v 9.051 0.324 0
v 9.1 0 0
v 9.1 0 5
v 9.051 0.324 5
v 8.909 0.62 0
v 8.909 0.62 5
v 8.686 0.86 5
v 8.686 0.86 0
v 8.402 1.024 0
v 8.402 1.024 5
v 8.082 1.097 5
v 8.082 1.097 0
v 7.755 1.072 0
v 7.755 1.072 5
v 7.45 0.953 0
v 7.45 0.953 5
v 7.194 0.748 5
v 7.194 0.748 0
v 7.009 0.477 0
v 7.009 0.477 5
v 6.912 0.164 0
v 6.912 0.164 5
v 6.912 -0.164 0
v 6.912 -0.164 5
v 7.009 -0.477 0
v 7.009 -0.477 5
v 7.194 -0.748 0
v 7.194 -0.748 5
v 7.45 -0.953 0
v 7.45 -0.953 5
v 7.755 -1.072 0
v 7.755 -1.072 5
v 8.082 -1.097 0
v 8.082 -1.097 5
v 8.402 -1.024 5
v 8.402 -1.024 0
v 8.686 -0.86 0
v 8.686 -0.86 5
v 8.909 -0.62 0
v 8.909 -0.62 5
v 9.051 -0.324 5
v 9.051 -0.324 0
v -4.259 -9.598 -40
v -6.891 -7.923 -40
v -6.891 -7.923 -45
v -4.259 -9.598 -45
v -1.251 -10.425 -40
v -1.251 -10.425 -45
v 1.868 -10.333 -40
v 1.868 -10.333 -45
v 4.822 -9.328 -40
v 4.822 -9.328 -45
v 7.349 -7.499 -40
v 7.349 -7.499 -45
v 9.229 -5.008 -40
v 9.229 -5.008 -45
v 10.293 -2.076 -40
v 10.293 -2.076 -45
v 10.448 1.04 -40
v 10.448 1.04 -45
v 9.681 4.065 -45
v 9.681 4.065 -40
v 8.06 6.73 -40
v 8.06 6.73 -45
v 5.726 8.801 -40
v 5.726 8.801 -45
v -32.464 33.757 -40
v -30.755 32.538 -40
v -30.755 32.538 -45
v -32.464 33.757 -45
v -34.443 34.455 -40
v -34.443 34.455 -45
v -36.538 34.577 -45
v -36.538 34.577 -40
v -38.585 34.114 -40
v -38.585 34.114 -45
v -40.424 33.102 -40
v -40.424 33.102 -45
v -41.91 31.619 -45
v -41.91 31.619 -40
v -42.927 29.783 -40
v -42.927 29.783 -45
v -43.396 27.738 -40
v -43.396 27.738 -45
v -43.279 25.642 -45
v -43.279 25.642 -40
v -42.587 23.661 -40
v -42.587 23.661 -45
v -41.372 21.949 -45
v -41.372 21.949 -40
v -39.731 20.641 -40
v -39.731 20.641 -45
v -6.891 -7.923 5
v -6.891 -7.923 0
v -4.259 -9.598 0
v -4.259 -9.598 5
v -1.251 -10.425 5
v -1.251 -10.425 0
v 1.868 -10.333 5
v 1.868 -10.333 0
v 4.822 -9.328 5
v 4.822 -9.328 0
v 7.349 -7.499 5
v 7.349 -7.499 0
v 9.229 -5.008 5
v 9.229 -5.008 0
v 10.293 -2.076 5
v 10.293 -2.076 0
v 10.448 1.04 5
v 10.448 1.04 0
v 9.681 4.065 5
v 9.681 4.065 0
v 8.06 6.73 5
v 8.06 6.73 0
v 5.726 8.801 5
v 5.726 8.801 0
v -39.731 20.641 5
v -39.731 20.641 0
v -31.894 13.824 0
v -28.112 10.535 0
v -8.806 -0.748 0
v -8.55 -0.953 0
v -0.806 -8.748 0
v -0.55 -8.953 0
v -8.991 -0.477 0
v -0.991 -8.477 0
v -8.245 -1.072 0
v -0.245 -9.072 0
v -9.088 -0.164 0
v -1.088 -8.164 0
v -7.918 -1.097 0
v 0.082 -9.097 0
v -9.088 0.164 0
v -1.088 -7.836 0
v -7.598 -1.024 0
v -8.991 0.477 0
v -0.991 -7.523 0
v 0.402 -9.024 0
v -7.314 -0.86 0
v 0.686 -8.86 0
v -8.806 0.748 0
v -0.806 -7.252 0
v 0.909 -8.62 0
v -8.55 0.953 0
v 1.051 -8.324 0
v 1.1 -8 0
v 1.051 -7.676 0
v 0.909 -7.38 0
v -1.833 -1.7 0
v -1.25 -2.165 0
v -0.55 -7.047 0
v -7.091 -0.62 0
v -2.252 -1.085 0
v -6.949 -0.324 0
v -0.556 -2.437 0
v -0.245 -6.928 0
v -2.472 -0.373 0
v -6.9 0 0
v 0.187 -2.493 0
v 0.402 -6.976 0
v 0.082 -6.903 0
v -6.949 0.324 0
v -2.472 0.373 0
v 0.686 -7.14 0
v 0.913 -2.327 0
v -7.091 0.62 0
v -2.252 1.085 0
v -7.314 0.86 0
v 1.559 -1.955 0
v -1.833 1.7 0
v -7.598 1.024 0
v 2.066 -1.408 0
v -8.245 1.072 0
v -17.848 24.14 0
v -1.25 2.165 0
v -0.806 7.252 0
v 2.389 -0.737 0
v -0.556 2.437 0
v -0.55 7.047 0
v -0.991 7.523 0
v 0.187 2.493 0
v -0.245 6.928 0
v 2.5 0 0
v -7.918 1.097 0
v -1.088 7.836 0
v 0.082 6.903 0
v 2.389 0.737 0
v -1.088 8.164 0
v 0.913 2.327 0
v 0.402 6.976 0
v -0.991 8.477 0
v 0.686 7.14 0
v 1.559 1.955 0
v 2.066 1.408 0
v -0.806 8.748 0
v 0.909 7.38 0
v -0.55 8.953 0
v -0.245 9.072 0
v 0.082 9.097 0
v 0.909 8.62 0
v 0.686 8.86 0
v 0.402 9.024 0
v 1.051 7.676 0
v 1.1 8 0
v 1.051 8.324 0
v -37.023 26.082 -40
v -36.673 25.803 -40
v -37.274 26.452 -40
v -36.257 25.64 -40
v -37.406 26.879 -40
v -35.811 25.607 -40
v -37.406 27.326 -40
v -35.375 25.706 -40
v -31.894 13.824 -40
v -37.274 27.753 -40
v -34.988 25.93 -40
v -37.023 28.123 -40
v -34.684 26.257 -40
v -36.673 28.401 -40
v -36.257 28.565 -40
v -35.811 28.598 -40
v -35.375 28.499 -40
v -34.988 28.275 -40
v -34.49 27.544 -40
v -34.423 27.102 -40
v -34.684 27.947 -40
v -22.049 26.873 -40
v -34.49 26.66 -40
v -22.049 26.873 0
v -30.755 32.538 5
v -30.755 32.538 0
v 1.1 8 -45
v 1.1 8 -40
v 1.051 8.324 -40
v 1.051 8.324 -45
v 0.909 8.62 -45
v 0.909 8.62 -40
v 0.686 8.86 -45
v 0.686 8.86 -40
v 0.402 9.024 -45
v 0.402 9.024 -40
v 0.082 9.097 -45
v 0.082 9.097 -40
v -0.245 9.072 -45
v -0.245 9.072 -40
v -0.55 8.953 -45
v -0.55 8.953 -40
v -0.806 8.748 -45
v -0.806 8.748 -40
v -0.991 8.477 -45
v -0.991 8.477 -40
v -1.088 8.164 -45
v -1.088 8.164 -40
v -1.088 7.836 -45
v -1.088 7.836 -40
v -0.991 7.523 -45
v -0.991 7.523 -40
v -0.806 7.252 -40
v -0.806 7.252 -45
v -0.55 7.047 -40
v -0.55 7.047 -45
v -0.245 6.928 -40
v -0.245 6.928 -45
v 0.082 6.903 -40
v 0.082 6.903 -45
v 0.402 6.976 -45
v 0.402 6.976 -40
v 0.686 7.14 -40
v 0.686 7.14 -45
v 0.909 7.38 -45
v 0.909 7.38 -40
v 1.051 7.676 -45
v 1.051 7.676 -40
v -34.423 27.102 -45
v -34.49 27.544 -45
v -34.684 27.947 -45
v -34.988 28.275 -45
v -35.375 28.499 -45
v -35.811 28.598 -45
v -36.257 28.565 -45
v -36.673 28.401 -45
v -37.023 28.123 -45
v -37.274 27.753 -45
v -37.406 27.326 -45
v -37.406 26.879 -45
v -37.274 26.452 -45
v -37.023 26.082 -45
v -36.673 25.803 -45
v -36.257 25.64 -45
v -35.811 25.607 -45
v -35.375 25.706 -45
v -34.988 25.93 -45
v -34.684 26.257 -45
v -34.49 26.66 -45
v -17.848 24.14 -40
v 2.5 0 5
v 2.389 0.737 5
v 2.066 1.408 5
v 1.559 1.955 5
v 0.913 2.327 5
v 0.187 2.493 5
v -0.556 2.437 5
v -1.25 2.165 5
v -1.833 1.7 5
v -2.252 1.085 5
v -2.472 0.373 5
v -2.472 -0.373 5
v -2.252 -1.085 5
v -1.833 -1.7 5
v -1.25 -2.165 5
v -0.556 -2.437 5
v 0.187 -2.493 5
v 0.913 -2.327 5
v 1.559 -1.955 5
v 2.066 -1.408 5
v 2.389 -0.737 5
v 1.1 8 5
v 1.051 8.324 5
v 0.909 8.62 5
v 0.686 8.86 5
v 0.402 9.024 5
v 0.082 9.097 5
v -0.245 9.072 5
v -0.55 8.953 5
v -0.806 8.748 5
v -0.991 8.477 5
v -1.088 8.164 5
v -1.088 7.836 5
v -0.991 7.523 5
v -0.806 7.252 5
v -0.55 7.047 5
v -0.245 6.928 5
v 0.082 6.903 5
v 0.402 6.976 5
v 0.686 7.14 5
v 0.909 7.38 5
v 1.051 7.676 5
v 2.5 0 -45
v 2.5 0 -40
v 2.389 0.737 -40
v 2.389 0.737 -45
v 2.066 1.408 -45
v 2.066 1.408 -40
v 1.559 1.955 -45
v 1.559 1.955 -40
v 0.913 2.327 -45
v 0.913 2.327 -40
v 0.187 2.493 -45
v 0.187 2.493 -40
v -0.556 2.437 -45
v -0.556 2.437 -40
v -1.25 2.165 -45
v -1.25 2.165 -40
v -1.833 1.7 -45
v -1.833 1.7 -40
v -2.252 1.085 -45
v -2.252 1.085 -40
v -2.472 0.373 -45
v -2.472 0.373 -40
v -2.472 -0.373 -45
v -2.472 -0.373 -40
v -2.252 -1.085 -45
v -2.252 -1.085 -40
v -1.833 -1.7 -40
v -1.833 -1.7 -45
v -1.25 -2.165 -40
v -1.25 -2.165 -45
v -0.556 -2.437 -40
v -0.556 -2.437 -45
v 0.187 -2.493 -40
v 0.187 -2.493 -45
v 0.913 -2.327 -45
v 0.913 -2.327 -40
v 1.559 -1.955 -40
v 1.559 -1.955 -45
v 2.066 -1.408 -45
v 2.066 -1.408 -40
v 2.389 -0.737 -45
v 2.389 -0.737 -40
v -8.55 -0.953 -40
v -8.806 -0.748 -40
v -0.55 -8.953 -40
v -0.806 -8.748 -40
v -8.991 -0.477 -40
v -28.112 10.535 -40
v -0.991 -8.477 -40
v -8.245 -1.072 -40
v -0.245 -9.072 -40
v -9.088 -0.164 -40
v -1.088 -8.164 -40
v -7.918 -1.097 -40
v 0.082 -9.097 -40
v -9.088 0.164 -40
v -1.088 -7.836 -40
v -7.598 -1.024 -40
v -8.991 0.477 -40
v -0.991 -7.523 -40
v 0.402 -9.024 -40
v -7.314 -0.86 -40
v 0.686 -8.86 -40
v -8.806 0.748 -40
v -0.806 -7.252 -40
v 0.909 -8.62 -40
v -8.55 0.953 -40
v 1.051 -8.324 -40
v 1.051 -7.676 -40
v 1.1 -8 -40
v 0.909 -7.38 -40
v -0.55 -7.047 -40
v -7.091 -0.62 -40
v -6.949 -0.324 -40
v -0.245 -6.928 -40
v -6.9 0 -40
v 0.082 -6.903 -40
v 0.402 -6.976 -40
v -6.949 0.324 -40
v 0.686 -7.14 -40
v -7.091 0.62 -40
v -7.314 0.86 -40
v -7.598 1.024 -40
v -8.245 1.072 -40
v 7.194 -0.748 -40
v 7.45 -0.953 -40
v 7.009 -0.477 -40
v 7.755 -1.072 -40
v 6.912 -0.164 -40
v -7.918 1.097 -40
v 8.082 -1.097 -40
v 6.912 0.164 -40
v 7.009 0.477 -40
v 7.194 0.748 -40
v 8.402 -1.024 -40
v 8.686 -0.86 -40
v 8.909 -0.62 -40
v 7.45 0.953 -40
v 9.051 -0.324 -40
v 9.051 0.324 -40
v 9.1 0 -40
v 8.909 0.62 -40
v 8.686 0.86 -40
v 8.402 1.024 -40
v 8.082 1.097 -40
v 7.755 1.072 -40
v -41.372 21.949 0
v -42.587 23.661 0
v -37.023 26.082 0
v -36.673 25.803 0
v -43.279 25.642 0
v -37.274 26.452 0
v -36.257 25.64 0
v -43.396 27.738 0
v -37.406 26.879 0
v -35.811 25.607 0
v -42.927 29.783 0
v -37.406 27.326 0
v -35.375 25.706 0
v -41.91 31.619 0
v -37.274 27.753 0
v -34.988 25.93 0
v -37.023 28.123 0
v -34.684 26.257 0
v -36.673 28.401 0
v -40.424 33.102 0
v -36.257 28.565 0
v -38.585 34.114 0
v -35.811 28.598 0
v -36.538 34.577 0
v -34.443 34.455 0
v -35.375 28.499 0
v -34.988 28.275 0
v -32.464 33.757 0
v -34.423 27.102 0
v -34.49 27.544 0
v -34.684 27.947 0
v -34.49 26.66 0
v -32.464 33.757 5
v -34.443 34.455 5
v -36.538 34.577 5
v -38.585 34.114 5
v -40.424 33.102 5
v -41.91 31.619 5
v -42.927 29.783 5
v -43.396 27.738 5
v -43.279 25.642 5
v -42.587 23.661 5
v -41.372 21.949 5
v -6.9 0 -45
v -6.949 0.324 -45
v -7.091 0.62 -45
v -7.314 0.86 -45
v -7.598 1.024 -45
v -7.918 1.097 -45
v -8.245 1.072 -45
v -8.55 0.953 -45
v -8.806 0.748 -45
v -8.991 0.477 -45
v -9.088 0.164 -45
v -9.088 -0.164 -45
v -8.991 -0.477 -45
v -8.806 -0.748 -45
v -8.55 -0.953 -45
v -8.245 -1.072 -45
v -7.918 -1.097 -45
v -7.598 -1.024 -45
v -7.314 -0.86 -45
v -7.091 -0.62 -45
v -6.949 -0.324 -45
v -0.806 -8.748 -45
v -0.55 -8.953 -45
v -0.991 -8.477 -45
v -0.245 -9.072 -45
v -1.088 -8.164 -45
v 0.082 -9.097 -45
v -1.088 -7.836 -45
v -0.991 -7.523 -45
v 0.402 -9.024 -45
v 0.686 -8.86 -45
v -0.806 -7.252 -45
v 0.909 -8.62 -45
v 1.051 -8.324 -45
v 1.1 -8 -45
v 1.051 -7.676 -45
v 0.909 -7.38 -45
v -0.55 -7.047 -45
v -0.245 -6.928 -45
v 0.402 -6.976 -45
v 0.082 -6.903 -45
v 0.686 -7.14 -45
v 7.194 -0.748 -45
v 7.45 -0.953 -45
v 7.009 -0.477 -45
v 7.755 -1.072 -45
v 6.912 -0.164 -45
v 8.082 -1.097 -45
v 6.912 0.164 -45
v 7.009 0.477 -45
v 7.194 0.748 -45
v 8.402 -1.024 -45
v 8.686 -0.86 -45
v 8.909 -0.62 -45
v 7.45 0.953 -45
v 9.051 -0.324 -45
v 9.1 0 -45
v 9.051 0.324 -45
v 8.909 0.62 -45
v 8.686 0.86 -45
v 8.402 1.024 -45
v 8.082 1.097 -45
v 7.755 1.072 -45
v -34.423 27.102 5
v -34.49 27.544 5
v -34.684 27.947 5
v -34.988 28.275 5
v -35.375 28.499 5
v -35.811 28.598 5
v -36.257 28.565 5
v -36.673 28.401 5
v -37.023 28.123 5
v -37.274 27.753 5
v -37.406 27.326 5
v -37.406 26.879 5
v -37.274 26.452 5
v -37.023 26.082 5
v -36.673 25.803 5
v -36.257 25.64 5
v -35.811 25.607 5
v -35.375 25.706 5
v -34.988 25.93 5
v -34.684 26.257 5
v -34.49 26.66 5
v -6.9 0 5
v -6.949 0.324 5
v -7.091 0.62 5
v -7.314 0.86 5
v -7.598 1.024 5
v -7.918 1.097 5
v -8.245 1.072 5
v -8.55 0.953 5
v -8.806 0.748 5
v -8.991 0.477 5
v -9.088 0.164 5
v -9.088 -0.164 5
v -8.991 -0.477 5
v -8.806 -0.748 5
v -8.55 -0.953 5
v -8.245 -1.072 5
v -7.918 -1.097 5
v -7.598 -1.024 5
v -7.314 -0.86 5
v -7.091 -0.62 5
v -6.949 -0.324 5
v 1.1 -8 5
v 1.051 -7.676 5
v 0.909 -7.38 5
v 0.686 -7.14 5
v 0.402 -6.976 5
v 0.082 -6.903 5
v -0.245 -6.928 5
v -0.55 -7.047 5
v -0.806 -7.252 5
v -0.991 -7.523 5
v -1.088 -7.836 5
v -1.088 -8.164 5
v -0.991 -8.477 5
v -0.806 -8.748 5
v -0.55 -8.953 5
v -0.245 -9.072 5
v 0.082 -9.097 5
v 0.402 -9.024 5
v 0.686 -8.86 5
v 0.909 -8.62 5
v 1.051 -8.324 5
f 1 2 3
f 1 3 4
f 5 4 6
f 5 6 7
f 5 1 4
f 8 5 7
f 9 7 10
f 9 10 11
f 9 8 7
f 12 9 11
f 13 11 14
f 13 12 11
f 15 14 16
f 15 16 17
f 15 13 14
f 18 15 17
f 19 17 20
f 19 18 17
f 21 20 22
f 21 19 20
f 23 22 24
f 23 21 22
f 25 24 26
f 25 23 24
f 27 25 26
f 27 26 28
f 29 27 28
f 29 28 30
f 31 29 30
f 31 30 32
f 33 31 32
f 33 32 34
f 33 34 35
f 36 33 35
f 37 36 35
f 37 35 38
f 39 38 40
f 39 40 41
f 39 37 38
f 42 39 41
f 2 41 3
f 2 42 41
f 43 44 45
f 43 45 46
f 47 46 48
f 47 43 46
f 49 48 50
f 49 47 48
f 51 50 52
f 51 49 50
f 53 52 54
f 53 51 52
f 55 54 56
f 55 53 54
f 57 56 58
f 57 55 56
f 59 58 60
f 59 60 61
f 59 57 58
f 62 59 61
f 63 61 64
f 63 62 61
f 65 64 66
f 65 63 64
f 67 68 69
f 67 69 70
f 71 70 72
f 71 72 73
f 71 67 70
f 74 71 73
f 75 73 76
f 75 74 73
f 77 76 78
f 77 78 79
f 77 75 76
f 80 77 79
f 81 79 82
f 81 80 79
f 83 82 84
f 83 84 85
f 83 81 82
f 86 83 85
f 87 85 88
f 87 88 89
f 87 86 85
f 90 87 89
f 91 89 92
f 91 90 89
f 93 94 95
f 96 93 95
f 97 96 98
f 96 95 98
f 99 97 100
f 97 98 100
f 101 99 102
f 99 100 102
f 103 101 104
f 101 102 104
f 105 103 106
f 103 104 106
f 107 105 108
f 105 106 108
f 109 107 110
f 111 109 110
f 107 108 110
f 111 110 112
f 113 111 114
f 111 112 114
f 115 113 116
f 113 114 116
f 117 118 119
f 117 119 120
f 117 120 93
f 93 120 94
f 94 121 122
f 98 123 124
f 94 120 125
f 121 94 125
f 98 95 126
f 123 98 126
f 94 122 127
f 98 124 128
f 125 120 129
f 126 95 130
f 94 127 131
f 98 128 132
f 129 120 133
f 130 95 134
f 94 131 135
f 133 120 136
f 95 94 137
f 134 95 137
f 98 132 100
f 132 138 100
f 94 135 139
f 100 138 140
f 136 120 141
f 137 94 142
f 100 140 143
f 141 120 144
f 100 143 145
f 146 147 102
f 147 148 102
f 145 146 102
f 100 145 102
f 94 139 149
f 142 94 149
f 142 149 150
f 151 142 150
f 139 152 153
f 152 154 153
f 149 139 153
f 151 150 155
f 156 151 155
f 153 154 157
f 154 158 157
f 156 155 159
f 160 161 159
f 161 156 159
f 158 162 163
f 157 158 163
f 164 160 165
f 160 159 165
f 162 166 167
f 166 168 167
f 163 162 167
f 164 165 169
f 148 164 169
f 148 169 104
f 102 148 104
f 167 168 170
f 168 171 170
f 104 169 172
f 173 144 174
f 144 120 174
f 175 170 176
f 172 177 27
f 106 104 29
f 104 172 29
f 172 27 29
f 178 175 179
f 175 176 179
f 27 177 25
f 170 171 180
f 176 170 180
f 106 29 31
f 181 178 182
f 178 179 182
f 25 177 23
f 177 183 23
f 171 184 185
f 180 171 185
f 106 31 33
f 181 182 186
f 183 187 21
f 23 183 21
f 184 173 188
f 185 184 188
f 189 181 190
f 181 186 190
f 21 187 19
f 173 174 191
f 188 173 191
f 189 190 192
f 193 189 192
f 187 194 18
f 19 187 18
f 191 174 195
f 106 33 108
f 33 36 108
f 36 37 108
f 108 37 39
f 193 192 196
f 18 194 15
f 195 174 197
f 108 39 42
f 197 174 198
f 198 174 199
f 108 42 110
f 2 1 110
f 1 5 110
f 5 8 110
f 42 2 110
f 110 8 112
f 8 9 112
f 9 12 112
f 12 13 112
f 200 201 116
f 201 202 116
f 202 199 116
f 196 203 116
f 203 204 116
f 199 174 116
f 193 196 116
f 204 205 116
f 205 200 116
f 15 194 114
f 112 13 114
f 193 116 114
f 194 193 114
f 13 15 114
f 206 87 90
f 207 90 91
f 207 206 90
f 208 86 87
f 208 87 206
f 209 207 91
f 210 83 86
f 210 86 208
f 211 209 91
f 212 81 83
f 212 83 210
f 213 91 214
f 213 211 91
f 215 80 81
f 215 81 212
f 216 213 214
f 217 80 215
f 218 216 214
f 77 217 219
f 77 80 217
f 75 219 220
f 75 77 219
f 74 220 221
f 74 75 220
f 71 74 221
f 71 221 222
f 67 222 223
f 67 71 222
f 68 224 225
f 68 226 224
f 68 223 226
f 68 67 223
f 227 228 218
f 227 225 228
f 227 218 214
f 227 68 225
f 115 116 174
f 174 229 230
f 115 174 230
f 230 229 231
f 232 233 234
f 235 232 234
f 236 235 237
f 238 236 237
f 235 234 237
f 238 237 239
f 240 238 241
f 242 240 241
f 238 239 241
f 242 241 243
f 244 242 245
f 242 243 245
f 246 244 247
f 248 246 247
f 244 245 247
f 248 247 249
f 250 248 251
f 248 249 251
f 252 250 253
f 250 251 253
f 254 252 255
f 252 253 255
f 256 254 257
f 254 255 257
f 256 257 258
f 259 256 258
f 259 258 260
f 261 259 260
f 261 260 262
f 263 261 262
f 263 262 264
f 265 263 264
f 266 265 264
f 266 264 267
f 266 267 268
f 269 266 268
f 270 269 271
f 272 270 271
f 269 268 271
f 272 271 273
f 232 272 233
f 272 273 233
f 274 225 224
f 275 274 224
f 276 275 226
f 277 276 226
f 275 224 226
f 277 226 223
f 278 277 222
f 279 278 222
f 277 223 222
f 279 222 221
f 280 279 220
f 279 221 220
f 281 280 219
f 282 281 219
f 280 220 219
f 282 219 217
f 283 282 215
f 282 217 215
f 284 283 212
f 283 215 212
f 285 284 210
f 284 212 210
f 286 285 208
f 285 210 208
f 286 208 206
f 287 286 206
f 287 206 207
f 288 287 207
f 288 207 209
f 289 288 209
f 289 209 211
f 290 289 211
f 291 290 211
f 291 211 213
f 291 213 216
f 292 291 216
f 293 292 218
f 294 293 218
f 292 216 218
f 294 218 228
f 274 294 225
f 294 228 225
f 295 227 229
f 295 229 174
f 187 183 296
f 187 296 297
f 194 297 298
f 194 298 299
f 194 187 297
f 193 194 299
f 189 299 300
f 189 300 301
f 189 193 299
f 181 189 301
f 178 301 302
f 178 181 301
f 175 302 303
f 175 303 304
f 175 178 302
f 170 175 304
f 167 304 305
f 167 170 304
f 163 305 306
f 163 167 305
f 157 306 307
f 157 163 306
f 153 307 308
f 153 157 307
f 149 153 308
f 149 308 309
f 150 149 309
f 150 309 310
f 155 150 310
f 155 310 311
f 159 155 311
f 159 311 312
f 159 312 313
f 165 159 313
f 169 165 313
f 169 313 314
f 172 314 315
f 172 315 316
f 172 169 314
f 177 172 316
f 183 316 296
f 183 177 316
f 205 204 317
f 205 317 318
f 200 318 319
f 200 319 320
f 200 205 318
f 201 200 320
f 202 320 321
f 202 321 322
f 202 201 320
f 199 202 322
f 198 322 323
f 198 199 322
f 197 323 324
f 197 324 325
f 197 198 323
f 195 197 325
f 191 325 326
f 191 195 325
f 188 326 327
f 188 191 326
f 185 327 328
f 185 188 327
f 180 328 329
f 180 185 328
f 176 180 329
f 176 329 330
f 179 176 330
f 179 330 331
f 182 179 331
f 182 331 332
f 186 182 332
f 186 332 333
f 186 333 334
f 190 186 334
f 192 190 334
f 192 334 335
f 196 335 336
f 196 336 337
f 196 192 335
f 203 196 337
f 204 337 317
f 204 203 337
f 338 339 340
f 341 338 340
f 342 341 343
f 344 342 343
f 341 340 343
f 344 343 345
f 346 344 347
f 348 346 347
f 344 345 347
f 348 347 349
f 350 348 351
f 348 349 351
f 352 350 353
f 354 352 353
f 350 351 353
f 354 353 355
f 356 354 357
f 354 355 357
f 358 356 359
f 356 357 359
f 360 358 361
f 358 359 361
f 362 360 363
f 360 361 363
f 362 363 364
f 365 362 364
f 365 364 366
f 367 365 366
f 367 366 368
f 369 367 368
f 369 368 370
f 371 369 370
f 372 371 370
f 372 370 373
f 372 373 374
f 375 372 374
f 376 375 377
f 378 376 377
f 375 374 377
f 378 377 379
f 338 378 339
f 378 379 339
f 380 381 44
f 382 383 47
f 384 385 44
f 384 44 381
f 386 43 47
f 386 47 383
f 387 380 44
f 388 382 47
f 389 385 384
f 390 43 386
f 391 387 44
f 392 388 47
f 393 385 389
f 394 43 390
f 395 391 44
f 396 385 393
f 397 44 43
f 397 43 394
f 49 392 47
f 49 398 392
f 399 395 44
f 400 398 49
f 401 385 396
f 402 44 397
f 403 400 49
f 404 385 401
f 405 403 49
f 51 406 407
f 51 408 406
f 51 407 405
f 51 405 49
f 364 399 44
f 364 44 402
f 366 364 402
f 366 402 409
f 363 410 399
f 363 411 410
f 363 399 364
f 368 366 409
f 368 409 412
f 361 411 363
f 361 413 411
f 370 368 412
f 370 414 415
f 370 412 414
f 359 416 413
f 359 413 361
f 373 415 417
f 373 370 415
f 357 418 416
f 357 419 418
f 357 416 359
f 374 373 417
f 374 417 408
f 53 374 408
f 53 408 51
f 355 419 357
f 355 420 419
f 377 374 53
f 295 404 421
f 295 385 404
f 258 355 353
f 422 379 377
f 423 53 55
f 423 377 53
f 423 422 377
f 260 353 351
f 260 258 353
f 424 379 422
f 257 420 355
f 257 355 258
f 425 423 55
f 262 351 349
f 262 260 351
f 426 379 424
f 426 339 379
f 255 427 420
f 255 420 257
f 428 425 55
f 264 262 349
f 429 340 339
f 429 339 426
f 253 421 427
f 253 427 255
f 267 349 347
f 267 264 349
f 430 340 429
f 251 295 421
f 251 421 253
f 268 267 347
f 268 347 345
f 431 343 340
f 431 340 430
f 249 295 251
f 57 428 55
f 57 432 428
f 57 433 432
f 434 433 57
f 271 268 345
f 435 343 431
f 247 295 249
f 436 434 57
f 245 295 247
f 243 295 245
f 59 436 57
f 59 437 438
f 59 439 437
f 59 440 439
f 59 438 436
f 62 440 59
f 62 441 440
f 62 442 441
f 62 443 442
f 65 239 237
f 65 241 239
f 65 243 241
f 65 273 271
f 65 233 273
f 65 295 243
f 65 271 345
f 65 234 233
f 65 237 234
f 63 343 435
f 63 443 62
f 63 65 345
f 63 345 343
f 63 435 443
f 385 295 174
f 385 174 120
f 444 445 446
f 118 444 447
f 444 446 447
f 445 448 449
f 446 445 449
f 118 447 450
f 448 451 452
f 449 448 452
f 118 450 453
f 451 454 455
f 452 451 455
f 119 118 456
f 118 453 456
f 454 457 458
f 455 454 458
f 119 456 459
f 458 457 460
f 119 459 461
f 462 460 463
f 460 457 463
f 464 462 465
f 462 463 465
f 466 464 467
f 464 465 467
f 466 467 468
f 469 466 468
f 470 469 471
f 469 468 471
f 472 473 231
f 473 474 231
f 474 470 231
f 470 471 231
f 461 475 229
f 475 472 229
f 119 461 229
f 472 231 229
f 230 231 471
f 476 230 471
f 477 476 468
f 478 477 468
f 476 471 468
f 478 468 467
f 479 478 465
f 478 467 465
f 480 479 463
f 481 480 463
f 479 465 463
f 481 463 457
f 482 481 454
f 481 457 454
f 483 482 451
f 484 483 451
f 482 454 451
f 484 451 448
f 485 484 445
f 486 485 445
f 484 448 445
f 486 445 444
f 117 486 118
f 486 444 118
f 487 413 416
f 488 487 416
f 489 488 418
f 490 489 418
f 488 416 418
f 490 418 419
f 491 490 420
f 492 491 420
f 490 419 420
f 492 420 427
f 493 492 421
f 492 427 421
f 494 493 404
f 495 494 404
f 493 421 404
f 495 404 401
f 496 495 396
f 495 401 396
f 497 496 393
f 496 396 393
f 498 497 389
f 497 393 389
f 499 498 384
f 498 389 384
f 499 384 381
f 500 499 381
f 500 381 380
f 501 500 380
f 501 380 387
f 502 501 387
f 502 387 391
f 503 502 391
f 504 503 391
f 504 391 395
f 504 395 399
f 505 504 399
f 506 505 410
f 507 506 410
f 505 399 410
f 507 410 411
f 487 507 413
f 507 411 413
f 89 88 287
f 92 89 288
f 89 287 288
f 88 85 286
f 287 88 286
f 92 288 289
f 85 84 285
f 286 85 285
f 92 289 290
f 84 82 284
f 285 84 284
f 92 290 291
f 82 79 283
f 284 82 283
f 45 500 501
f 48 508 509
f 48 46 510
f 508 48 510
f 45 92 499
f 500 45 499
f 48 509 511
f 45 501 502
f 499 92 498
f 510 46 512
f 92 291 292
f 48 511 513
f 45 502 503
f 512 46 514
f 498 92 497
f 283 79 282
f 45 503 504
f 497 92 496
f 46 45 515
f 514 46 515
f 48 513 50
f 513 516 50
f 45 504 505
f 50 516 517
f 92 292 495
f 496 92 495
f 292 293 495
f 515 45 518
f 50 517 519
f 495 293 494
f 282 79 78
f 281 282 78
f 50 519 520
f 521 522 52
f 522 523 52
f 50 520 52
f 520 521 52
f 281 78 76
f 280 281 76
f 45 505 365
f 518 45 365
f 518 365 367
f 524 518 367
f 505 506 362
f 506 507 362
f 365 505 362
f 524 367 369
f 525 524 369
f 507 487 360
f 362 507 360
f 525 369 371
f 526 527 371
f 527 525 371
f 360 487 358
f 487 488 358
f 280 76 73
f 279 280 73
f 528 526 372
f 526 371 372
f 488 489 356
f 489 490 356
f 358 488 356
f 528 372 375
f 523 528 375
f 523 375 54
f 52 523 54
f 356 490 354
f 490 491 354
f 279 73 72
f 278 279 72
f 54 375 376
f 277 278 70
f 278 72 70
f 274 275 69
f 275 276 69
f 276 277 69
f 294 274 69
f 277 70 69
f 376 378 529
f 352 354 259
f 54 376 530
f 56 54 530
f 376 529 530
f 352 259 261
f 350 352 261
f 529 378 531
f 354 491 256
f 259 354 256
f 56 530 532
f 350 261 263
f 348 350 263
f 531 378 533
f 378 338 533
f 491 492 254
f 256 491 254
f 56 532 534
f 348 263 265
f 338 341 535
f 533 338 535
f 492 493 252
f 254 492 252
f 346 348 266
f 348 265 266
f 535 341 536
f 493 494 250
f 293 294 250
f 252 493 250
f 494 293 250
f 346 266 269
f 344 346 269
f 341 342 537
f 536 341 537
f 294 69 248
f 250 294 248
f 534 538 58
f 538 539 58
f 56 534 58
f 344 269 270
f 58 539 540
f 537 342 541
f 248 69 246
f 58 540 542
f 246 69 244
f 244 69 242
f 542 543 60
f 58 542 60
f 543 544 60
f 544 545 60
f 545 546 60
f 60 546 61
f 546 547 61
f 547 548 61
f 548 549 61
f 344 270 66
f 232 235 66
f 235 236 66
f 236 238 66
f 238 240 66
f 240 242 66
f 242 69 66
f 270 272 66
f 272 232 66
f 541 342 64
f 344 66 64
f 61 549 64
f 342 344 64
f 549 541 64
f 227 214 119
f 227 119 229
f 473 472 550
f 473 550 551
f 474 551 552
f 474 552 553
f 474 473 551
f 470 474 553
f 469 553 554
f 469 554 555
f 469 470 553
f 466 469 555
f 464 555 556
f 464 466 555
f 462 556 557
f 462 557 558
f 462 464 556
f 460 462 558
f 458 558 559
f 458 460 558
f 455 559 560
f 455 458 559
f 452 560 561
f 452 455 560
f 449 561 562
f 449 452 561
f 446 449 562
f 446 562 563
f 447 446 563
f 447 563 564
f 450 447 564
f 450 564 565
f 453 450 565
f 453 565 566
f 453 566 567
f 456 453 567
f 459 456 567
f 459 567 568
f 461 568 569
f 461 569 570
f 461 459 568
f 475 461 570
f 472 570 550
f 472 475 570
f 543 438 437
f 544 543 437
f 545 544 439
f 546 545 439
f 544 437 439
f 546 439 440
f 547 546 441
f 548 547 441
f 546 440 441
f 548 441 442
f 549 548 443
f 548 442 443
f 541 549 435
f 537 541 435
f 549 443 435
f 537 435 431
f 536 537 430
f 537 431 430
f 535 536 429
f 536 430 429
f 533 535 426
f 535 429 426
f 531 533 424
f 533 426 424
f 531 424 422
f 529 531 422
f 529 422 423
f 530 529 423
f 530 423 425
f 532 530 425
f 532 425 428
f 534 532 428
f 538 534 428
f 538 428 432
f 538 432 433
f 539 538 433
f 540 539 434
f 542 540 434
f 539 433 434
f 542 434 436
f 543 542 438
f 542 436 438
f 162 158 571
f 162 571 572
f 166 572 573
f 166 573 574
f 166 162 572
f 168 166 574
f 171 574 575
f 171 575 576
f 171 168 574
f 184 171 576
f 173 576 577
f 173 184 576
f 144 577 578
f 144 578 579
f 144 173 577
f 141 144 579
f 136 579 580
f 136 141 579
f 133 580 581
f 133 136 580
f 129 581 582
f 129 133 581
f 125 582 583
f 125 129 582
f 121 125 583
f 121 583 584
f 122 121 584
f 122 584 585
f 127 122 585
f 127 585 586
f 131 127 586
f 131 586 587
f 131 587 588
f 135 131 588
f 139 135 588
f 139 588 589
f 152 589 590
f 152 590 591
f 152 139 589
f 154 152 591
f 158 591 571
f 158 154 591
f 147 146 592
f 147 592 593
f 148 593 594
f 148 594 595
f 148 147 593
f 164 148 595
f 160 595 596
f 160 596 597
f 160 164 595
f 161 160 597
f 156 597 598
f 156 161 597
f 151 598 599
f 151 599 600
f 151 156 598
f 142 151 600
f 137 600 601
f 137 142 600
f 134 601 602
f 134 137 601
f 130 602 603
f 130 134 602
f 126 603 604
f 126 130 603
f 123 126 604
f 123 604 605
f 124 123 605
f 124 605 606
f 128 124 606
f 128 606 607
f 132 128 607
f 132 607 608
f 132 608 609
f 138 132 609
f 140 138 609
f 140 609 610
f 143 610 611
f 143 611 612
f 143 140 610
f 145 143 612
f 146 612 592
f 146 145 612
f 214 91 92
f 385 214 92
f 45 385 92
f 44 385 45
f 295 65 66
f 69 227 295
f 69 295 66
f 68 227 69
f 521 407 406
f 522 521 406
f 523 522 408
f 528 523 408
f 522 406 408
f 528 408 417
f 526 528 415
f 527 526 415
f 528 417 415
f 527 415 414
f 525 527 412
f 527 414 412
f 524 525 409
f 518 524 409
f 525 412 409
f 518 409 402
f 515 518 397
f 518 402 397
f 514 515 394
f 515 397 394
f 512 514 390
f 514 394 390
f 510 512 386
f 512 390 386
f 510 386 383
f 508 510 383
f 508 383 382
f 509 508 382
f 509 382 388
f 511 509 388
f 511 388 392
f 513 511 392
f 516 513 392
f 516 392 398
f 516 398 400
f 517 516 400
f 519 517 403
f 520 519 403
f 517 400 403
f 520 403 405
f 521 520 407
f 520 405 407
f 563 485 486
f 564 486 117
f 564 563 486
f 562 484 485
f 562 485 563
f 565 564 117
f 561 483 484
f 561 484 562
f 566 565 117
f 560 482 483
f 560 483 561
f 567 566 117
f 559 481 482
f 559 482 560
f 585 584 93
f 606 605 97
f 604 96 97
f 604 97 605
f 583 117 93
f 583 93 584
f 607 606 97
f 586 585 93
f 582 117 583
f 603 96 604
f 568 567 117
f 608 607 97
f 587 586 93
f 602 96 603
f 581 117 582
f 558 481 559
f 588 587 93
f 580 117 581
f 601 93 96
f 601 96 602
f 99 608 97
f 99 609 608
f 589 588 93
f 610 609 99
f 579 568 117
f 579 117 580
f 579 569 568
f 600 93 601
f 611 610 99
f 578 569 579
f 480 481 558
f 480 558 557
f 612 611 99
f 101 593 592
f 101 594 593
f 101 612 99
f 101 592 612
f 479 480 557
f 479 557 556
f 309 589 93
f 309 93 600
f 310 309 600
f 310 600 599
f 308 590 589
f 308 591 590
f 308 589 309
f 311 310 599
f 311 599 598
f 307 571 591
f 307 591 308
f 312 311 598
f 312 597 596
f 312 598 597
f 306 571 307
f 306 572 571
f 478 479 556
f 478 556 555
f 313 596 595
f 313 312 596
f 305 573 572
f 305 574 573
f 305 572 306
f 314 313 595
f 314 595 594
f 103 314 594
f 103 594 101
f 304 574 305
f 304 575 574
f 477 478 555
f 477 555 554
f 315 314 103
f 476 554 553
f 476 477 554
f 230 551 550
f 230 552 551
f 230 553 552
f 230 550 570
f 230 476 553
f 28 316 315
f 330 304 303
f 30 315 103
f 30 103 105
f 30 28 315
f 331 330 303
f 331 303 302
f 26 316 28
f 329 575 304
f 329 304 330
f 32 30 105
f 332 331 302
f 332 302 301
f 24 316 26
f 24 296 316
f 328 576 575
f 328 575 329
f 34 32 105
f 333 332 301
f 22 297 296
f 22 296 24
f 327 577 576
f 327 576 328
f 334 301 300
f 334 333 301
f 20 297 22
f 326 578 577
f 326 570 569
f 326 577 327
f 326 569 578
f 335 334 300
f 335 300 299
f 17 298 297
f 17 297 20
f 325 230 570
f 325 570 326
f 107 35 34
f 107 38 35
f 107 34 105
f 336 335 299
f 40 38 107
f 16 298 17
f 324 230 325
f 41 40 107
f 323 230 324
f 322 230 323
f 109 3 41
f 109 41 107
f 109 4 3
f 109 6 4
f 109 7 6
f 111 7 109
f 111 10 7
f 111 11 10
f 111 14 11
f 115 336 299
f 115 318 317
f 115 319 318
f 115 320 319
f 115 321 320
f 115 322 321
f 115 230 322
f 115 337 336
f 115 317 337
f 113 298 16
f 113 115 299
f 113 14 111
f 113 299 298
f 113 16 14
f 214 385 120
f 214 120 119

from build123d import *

# Parameters (mm, degrees)
ESQUISSE1_R        = 1.1
ESQUISSE1_R_2      = 1.5
ESQUISSE1_R_3      = 2.5
BOSS_EXTRU_1_DEPTH = 5
BOSS_EXTRU_2_DEPTH = 20


with BuildPart() as part:
    # Esquisse1 → Boss.-Extru.1 (new body)
    with BuildSketch(Plane.XY):
        with BuildLine():
            Line((5.726385479, 8.801051605), (-30.755113053, 32.537660912))
            ThreePointArc((-30.755113053, 32.537660912), (-41.910189263, 31.619393351), (-39.730753447, 20.640823312))
            Line((-39.730753447, 20.640823312), (-6.890823906, -7.922534058))
            ThreePointArc((-6.890823906, -7.922534058), (8.382037853, -6.32387867), (5.726385479, 8.801051605))
        make_face()
        with Locations((0, 8)):
            Circle(ESQUISSE1_R, mode=Mode.SUBTRACT)
        with Locations((8, 0)):
            Circle(ESQUISSE1_R, mode=Mode.SUBTRACT)
        with Locations((0, -8)):
            Circle(ESQUISSE1_R, mode=Mode.SUBTRACT)
        with Locations((-8, 0)):
            Circle(ESQUISSE1_R, mode=Mode.SUBTRACT)
        with Locations((-35.923019369, 27.102337158)):
            Circle(ESQUISSE1_R_2, mode=Mode.SUBTRACT)
        Circle(ESQUISSE1_R_3, mode=Mode.SUBTRACT)
    boss_extru_1 = extrude(amount=BOSS_EXTRU_1_DEPTH)

    # Esquisse2 → Boss.-Extru.2 (add)
    with BuildSketch(Plane(origin=(0, 0, 0), x_dir=(-1, 0, 0), z_dir=(0, 0, -1))):
        Polygon((17.847870487, 24.139591031), (28.111906813, 10.535038273), (31.893676134, 13.824327565), (22.048994358, 26.873043329), align=None)
    boss_extru_2 = extrude(amount=BOSS_EXTRU_2_DEPTH)

    # Symétrie1: Boss.-Extru.1, Boss.-Extru.2 across plane
    add(boss_extru_1.mirror(Plane.XY.offset(-20)))
    add(boss_extru_2.mirror(Plane.XY.offset(-20)))


solid = part.part
